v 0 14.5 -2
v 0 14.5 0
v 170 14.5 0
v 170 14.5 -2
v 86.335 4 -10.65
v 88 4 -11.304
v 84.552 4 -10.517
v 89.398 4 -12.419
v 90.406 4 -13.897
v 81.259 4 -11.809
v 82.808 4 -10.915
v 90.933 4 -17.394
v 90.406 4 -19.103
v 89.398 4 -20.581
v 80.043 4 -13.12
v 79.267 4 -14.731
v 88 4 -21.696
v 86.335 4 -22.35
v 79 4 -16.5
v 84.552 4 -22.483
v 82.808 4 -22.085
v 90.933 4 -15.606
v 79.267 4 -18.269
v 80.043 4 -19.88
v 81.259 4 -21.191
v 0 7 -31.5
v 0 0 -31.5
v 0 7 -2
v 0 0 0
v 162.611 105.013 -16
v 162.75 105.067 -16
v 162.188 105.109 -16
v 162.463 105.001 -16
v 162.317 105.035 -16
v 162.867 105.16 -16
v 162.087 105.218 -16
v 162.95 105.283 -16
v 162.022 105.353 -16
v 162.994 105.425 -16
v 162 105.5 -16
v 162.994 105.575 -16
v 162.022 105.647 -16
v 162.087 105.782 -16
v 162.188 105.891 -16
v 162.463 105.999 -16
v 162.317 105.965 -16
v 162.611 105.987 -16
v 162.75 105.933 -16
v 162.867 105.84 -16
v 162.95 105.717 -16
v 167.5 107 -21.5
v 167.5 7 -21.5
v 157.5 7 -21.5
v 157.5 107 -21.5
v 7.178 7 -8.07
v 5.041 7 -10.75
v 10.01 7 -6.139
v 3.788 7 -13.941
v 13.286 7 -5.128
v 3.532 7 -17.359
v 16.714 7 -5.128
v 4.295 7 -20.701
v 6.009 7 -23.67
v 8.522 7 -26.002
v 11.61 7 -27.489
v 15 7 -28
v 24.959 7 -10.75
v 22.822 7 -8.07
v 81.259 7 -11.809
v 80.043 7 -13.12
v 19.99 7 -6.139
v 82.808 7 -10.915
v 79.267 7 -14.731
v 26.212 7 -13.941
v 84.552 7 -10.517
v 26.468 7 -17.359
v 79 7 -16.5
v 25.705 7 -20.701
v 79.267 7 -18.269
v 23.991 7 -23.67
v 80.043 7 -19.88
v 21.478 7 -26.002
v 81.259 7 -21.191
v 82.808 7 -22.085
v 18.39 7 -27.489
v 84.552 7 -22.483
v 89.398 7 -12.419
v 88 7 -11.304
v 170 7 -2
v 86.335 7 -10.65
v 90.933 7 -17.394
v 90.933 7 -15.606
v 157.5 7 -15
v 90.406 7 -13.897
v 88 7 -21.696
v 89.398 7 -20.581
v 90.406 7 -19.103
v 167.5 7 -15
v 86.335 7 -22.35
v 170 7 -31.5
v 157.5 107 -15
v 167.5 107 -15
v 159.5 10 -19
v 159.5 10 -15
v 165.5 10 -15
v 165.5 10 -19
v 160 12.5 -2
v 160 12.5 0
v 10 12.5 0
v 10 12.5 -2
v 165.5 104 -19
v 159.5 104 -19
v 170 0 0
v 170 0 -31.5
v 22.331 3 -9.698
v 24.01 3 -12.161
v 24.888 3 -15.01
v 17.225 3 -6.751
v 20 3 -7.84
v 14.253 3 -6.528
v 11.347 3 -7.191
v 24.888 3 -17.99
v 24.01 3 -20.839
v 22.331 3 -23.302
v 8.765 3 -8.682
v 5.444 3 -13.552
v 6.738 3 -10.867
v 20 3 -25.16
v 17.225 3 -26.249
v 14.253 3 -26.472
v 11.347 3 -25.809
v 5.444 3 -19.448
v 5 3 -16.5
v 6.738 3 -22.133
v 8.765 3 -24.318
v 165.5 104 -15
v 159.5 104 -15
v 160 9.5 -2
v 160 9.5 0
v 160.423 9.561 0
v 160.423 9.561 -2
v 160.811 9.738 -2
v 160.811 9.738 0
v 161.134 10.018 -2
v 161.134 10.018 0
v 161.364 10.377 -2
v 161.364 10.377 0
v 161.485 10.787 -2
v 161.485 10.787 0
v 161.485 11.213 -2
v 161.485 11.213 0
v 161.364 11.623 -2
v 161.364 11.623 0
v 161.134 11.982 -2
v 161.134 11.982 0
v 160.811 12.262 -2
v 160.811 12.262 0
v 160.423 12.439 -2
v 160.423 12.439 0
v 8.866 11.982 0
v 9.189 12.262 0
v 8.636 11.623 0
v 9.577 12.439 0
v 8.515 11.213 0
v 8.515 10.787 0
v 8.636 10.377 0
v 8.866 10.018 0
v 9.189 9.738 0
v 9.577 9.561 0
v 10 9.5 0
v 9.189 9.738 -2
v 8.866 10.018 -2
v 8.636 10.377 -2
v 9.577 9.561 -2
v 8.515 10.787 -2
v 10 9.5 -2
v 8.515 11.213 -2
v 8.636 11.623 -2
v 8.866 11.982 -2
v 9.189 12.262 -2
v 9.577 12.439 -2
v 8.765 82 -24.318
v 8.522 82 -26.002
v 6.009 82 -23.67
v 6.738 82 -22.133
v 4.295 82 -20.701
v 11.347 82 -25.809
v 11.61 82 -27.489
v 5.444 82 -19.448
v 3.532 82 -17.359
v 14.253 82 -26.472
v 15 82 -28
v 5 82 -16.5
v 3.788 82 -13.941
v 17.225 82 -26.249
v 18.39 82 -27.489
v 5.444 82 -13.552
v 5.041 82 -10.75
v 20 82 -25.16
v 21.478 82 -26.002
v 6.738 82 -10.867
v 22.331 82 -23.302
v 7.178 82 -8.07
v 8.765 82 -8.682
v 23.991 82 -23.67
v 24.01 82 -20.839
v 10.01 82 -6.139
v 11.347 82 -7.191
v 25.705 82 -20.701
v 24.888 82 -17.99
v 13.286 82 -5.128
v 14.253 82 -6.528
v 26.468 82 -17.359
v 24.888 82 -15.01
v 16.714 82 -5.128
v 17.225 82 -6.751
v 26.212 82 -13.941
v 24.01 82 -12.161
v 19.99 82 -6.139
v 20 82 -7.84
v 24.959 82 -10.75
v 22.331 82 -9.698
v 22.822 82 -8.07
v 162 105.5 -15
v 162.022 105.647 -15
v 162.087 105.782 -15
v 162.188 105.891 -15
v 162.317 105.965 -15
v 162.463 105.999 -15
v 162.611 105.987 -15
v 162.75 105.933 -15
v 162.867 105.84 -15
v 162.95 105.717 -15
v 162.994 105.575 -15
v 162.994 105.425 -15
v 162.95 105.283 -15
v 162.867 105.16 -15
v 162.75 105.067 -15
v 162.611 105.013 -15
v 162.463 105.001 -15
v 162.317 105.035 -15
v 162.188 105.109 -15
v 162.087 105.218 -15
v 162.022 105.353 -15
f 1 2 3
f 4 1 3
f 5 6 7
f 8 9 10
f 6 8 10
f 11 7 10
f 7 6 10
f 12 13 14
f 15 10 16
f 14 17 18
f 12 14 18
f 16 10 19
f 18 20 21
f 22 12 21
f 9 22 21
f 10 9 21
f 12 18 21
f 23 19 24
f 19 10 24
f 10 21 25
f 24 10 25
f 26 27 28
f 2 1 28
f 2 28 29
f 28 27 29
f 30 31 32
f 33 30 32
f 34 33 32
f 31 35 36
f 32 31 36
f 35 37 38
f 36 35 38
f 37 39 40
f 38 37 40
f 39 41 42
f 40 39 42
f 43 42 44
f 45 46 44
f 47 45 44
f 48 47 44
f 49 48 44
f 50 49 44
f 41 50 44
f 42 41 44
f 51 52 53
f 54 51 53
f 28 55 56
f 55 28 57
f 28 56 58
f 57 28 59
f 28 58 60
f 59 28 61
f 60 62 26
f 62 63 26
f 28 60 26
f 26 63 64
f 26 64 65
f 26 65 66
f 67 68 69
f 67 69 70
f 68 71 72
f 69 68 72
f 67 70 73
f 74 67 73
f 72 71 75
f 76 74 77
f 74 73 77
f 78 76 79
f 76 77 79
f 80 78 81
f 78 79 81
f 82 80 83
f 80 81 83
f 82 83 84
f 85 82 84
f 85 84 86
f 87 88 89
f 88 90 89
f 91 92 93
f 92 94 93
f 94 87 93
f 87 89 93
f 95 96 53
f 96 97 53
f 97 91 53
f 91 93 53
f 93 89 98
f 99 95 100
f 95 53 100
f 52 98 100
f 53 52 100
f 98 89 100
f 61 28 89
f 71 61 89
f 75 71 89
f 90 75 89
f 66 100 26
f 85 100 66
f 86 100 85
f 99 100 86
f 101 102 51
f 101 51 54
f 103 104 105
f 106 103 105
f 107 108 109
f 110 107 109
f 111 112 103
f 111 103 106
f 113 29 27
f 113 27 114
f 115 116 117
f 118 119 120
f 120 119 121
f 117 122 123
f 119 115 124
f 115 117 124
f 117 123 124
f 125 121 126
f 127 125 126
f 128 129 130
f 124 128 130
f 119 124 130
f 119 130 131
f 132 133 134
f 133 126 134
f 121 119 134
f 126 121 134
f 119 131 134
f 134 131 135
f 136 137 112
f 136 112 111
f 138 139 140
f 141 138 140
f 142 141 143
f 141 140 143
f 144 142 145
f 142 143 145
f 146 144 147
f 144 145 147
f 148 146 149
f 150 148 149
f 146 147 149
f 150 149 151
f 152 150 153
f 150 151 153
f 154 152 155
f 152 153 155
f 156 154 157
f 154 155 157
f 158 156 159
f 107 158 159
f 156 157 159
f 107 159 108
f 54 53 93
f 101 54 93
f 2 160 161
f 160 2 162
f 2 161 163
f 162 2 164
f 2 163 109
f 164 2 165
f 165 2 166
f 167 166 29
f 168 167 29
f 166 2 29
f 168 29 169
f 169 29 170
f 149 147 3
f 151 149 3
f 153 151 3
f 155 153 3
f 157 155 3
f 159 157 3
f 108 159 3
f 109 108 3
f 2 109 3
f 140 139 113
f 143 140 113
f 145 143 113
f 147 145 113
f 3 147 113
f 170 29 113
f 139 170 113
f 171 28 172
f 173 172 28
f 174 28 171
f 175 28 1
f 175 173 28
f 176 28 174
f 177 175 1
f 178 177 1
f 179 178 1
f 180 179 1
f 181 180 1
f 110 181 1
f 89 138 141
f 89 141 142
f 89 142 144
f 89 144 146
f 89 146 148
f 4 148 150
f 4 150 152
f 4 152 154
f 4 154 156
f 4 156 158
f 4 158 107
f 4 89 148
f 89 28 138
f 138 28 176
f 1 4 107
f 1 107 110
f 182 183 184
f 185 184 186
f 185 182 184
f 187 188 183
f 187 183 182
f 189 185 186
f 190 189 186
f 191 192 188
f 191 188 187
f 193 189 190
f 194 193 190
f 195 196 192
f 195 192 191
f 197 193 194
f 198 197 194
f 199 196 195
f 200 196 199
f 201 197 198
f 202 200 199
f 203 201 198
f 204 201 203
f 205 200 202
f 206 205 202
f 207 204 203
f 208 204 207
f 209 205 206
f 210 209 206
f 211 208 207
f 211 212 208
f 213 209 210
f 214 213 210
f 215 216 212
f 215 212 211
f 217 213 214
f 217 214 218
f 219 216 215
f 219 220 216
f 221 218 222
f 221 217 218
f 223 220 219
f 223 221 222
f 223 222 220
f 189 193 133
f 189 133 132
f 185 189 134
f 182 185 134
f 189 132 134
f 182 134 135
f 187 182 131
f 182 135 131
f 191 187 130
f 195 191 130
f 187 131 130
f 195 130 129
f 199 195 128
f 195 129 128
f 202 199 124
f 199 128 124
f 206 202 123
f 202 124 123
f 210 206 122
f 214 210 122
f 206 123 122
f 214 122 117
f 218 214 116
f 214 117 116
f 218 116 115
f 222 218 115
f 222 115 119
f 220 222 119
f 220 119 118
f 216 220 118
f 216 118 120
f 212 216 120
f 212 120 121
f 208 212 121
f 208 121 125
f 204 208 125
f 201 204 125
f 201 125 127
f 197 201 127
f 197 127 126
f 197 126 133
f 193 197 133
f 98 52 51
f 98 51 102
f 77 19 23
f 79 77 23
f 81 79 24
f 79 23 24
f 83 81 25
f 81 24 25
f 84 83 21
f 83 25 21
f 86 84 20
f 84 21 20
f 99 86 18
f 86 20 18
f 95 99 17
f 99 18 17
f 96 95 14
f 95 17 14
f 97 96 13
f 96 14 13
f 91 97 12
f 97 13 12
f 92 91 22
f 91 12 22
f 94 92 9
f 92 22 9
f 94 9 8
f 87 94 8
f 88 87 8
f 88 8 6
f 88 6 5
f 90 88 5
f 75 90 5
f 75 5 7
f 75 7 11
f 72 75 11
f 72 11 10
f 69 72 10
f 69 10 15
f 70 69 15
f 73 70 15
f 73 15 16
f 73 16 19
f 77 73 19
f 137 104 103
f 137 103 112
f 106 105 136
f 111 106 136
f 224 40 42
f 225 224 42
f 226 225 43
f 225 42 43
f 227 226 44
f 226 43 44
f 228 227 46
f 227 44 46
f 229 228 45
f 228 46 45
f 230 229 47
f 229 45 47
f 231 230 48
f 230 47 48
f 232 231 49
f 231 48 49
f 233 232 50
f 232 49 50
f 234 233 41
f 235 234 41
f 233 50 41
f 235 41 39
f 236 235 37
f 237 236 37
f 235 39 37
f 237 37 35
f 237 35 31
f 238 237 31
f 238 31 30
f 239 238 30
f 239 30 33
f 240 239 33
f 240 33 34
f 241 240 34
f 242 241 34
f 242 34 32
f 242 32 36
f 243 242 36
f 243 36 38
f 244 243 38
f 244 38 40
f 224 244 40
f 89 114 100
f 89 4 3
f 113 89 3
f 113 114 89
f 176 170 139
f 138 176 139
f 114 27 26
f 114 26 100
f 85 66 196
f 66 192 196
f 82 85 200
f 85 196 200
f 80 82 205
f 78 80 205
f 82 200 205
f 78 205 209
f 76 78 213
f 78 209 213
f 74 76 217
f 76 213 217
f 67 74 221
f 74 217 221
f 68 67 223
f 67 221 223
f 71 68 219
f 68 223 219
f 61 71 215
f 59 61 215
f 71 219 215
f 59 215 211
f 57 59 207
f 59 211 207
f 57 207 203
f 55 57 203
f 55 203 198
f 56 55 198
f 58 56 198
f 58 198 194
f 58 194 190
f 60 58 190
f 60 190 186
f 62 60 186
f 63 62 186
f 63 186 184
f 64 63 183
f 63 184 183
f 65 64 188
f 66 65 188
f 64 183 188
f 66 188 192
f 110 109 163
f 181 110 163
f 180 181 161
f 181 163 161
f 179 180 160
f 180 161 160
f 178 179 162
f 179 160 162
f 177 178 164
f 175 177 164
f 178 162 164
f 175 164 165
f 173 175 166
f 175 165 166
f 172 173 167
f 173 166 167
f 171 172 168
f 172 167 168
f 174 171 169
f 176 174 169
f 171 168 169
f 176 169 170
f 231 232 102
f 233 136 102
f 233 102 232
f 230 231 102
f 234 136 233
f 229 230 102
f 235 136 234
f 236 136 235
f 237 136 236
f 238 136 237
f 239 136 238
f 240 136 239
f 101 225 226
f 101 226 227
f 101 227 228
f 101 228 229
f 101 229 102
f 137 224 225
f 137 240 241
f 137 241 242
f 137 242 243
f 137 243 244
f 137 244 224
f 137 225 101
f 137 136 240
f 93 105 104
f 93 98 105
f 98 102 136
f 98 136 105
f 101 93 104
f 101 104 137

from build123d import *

# Parameters (mm, degrees)
SKETCH1_W                      = 170
SKETCH1_H                      = 31.5
BOSS_EXTRUDE1_DEPTH            = 14.5
SKETCH2_W                      = 29.500000008
SKETCH2_H                      = 7.499999998
CUT_EXTRUDE1_DEPTH             = 174.50072046
CUT_EXTRUDE2_DEPTH             = 174.50072046
SKETCH4_W                      = 10.000000025
SKETCH4_H                      = 6.5
BOSS_EXTRUDE2_DEPTH            = 100
SKETCH5_W                      = 6
SKETCH5_H                      = 94
CUT_EXTRUDE3_DEPTH             = 4
SKETCH6_W                      = 11.5
SKETCH6_H                      = 75
F_12_0_12_DIAMETER_HOLE1_D     = 12
F_12_0_12_DIAMETER_HOLE1_DEPTH = 3
F_1_0_1_DIAMETER_HOLE1_D       = 1
F_1_0_1_DIAMETER_HOLE1_DEPTH   = 1
F_20_0_20_DIAMETER_HOLE1_D     = 20
F_20_0_20_DIAMETER_HOLE1_DEPTH = 79


with BuildPart() as part:
    # Sketch1 → Boss-Extrude1 (new body)
    with BuildSketch(Plane.XZ):
        with Locations((85, -15.75)):
            Rectangle(SKETCH1_W, SKETCH1_H)
    extrude(amount=-BOSS_EXTRUDE1_DEPTH)

    # Sketch2 → Cut-Extrude1 (cut, through all)
    with BuildSketch(Plane(origin=(170, 0, 0), x_dir=(0, 0, -1), z_dir=(1, 0, 0))):
        with Locations((16.749999996, 10.750000001)):
            Rectangle(SKETCH2_W, SKETCH2_H)
    extrude(amount=-CUT_EXTRUDE1_DEPTH, mode=Mode.SUBTRACT)

    # Sketch3 → Cut-Extrude2 (cut, through all)
    with BuildSketch(Plane.XY):
        with BuildLine():
            Line((160, 12.5), (10, 12.5))
            ThreePointArc((10, 12.5), (8.500000001, 11.000000001), (10, 9.500000002))
            Line((10, 9.500000002), (160, 9.500000002))
            ThreePointArc((160, 9.500000002), (161.499999999, 11.000000001), (160, 12.5))
        make_face()
    extrude(amount=-CUT_EXTRUDE2_DEPTH, mode=Mode.SUBTRACT)

    # Sketch4 → Boss-Extrude2 (add)
    with BuildSketch(Plane(origin=(0, 7.000000002, 0), x_dir=(-1, 0, 0), z_dir=(0, 1, 0))):
        with Locations((-162.500000003, -18.249999999)):
            Rectangle(SKETCH4_W, SKETCH4_H)
    extrude(amount=BOSS_EXTRUDE2_DEPTH)

    # Sketch5 → Cut-Extrude3 (cut)
    with BuildSketch(Plane.XY.offset(-14.999999999)):
        with Locations((162.5, 57)):
            Rectangle(SKETCH5_W, SKETCH5_H)
    extrude(amount=-CUT_EXTRUDE3_DEPTH, mode=Mode.SUBTRACT)

    # Sketch6 → Revolve1 (revolve)
    with BuildSketch(Plane.XY.offset(-16.5), mode=Mode.PRIVATE) as revolve1_sk:
        with Locations((20.75, 44.5)):
            Rectangle(SKETCH6_W, SKETCH6_H)
    revolve(revolve1_sk.sketch.rotate(Axis((15, 82, -16.5), (0, -1, 0)), 270), axis=Axis((15, 82, -16.5), (0, -1, 0)))

    # Ø12.0 (12) Diameter Hole1
    with Locations(Plane(origin=(0, 7.000000002, 0), x_dir=(1, 0, 0), z_dir=(0, 1, 0))):
        with Locations((85, 16.5)):
            Hole(F_12_0_12_DIAMETER_HOLE1_D / 2, depth=F_12_0_12_DIAMETER_HOLE1_DEPTH)

    # Ø1.0 (1) Diameter Hole1
    with Locations(Plane.XY.offset(-14.999999999)):
        with Locations((162.5, 105.5)):
            Hole(F_1_0_1_DIAMETER_HOLE1_D / 2, depth=F_1_0_1_DIAMETER_HOLE1_DEPTH)

    # Ø20.0 (20) Diameter Hole1
    with Locations(Plane(origin=(0, 82, 0), x_dir=(1, 0, 0), z_dir=(0, 1, 0))):
        with Locations((15, 16.5)):
            Hole(F_20_0_20_DIAMETER_HOLE1_D / 2, depth=F_20_0_20_DIAMETER_HOLE1_DEPTH)


solid = part.part
